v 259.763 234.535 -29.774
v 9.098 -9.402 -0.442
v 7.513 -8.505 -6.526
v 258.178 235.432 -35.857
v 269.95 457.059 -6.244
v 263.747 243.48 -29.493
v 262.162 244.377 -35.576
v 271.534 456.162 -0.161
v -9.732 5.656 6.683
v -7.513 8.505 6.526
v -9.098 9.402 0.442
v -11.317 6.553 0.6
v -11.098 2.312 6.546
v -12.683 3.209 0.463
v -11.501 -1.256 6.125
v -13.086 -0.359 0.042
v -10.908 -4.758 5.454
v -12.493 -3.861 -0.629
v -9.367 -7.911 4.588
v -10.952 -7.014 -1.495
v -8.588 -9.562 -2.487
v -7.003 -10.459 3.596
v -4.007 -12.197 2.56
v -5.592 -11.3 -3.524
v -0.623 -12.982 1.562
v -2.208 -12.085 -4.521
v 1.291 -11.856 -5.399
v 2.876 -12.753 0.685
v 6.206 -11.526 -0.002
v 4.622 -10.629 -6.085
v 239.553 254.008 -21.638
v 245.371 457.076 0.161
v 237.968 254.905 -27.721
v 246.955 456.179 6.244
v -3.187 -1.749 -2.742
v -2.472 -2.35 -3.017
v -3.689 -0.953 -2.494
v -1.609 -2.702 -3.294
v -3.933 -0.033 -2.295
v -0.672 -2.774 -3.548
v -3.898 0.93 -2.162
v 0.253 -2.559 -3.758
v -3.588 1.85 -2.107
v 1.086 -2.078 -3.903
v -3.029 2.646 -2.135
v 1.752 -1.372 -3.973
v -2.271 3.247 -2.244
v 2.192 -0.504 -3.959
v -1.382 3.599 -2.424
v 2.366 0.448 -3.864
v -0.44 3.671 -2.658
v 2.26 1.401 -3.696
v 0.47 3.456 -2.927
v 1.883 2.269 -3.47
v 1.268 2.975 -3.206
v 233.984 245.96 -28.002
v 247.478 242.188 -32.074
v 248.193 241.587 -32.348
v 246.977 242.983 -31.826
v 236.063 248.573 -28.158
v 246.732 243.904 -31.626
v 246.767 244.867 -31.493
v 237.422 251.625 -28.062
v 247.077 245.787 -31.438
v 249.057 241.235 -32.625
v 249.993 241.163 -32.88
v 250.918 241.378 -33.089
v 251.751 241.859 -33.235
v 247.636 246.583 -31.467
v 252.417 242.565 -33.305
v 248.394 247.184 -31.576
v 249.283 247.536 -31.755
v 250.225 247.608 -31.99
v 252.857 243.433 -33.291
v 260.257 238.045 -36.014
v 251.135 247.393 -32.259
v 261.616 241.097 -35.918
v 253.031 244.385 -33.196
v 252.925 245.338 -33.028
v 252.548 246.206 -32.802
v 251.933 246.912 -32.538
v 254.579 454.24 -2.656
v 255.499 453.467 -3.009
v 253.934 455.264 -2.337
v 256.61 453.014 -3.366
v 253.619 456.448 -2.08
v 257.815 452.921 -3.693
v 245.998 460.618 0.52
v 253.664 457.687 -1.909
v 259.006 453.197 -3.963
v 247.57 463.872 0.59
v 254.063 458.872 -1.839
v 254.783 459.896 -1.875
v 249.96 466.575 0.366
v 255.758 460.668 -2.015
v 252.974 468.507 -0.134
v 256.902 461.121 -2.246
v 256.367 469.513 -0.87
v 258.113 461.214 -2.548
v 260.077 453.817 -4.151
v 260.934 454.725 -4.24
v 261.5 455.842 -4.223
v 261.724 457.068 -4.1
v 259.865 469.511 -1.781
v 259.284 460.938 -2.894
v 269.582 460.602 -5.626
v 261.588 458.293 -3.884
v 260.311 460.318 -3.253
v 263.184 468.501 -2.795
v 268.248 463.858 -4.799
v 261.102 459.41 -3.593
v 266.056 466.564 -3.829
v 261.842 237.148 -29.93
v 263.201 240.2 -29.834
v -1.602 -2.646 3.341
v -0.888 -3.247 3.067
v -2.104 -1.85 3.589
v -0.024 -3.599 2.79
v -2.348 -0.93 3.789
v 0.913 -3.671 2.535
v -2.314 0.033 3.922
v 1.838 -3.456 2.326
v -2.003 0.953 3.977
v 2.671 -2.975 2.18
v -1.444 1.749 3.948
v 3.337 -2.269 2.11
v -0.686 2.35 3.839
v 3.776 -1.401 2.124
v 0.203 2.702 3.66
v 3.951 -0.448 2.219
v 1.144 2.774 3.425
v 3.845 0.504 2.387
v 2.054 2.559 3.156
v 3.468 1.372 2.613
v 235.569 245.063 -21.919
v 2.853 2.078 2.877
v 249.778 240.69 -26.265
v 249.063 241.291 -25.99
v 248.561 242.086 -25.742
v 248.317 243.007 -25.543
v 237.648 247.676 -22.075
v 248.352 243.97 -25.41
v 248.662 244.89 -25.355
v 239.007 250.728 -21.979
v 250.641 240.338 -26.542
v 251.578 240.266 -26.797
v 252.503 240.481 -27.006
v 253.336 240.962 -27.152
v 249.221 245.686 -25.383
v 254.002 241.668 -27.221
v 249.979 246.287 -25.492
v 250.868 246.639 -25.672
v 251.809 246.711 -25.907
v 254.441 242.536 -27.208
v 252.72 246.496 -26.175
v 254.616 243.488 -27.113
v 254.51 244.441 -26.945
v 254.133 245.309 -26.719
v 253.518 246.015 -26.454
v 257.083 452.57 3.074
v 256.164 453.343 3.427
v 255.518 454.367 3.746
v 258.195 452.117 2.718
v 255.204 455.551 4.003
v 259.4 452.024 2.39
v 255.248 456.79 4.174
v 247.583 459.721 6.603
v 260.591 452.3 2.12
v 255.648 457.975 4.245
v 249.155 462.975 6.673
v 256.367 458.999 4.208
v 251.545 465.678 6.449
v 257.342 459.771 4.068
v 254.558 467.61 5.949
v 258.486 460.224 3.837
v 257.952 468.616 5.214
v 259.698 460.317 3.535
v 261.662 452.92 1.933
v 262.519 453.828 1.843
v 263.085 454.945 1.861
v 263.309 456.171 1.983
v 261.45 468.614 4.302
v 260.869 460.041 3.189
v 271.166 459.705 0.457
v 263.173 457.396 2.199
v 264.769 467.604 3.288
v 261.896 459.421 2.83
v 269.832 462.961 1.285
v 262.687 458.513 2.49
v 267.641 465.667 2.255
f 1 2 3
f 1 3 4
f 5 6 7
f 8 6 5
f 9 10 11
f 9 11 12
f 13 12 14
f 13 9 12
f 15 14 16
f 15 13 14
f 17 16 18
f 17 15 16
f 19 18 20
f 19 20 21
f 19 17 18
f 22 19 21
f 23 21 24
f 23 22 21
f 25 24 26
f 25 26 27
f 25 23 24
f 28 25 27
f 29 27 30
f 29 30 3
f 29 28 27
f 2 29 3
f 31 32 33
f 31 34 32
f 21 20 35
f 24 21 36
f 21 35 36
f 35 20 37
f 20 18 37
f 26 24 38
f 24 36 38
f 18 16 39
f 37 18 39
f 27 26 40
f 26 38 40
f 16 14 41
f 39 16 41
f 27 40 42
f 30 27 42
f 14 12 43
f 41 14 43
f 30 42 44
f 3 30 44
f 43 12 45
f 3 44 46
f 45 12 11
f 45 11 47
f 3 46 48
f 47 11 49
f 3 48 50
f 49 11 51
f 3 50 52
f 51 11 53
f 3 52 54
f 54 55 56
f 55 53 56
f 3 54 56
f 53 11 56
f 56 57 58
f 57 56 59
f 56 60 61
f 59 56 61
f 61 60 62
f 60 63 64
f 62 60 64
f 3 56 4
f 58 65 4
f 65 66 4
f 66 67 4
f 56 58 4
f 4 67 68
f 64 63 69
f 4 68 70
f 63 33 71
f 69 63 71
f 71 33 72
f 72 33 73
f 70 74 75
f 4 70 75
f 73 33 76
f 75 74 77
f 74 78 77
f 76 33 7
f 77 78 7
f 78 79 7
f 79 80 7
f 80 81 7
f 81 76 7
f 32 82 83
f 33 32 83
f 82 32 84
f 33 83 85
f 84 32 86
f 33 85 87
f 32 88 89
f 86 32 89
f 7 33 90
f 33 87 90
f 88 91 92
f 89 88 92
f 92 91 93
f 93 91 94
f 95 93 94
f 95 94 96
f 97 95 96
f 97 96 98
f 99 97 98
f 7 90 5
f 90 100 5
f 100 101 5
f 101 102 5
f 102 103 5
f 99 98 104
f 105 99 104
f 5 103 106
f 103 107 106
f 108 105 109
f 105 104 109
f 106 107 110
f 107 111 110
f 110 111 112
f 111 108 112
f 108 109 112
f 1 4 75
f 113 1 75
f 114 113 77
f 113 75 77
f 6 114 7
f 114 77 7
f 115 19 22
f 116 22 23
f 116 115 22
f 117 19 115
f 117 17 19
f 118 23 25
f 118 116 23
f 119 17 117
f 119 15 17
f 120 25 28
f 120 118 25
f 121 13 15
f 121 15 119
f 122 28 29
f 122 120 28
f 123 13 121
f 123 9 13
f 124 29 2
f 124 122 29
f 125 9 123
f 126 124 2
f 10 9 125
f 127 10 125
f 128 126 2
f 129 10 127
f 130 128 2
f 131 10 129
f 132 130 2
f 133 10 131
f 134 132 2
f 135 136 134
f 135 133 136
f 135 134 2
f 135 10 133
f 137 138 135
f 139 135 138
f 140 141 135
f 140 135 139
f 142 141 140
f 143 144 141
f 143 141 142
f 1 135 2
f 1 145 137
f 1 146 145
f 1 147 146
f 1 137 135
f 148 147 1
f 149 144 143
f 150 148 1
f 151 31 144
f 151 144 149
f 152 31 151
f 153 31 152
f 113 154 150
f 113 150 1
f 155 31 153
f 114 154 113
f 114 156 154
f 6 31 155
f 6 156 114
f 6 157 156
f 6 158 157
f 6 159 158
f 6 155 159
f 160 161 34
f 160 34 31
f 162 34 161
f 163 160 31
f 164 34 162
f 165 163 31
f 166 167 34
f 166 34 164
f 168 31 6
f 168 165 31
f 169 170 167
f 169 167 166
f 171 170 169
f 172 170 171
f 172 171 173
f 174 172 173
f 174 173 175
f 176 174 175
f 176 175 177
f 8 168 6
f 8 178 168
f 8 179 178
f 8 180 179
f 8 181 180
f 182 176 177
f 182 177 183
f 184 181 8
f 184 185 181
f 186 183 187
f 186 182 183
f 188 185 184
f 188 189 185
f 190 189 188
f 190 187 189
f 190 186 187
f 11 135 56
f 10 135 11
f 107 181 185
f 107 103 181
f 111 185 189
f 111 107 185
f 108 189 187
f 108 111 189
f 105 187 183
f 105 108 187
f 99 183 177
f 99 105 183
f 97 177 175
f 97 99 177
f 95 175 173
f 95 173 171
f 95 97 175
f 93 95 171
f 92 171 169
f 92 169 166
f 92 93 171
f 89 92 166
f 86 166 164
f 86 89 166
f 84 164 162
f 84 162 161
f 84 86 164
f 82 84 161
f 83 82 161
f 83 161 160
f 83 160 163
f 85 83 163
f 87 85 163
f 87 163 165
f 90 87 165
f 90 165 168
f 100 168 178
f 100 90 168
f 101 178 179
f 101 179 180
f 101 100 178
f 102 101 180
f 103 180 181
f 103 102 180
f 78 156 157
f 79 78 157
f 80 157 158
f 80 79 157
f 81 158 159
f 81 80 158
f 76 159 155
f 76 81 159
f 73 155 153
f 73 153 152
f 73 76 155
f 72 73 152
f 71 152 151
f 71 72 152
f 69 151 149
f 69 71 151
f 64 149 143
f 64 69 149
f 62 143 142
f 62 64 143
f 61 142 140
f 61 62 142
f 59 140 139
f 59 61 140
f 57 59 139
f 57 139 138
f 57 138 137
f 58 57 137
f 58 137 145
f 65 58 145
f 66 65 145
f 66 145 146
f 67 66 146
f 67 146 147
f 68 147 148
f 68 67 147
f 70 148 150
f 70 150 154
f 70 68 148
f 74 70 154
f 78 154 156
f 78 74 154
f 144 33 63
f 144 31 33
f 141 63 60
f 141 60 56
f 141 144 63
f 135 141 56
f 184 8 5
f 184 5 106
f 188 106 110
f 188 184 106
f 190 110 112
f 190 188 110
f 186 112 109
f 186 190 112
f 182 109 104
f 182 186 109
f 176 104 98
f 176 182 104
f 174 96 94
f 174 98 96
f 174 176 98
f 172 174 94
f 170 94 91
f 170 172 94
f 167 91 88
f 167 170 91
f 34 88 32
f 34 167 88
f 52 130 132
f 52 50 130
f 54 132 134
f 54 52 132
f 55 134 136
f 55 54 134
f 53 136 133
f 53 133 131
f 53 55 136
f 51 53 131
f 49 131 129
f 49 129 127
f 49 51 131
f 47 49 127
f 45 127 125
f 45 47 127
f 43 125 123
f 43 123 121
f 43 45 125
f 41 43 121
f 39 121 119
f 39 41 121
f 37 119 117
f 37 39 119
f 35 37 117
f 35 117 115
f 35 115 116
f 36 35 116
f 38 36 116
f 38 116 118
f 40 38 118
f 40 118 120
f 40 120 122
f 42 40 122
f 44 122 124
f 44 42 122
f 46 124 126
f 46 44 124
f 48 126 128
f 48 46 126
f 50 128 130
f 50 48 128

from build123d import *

# Parameters (mm, degrees)
SKETCH2_R           = 12.7
SKETCH2_R_2         = 3.2639
SKETCH2_R_3         = 4.19989
BOSS_EXTRUDE1_DEPTH = 3.175


with BuildPart() as part:
    # Sketch2 → Boss-Extrude1 (new, symmetric)
    # profile 1 of 7: a face of its own
    with BuildSketch(Plane(origin=(0, 0, 0), x_dir=(0.9683571483215458, 0.03640581426885692, -0.2468988658985399), z_dir=(0.24956849419460725, -0.14125913850417393, 0.9579986547456604))):
        with BuildLine():
            Line((242.448329145, 239.243930423), (-8.577063088, 9.366108518))
            ThreePointArc((-8.577063088, 9.366108518), (5.11670298, 11.623654787), (12.7, 0))
            ThreePointArc((12.7, 0), (11.623654787, -5.11670298), (8.577063088, -9.366108518))
            Line((8.577063088, -9.366108518), (267.433066466, 227.682636686))
            ThreePointArc((267.433066466, 227.682636686), (253.522604962, 225.522910686), (246.164904285, 237.524143805))
            Line((246.164904285, 237.524143805), (246.363634717, 242.829392073))
            Line((246.363634717, 242.829392073), (242.448329145, 239.243930423))
        make_face()
    # profile 2 of 7: a face of its own
    with BuildSketch(Plane(origin=(0, 0, 0), x_dir=(0.9683571483215458, 0.03640581426885692, -0.2468988658985399), z_dir=(0.24956849419460725, -0.14125913850417393, 0.9579986547456604))):
        Circle(SKETCH2_R)
        with Locations(Location((0, 0, 0), (0, 0, 357.892497398))):
            Circle(SKETCH2_R_2, mode=Mode.SUBTRACT)
    # profile 3 of 7: a face of its own
    with BuildSketch(Plane(origin=(0, 0, 0), x_dir=(0.9683571483215458, 0.03640581426885692, -0.2468988658985399), z_dir=(0.24956849419460725, -0.14125913850417393, 0.9579986547456604))):
        with Locations((258.856003378, 237.048745204)):
            Circle(SKETCH2_R)
        with Locations(Location((258.856003378, 237.048745204, 0), (0, 0, 357.892497398))):
            Circle(SKETCH2_R_2, mode=Mode.SUBTRACT)
    # profile 4 of 7: a face of its own
    with BuildSketch(Plane(origin=(0, 0, 0), x_dir=(0.9683571483215458, 0.03640581426885692, -0.2468988658985399), z_dir=(0.24956849419460725, -0.14125913850417393, 0.9579986547456604))):
        with BuildLine():
            Line((246.562365149, 248.134640341), (246.363634717, 242.829392073))
            Line((246.363634717, 242.829392073), (250.278940289, 246.414853723))
            ThreePointArc((250.278940289, 246.414853723), (263.972706358, 248.672399992), (271.556003378, 237.048745204))
            ThreePointArc((271.556003378, 237.048745204), (271.553777956, 236.811004245), (271.54710247, 236.573346604))
            Line((271.54710247, 236.573346604), (279.589066496, 451.259216922))
            ThreePointArc((279.589066496, 451.259216922), (266.422568803, 439.04351643), (254.206868311, 452.210014123))
            Line((254.206868311, 452.210014123), (246.562365149, 248.134640341))
        make_face()
    # profile 5 of 7: a face of its own
    with BuildSketch(Plane(origin=(0, 0, 0), x_dir=(0.9683571483215458, 0.03640581426885692, -0.2468988658985399), z_dir=(0.24956849419460725, -0.14125913850417393, 0.9579986547456604))):
        with BuildLine():
            Line((250.278940289, 246.414853723), (246.363634717, 242.829392073))
            Line((246.363634717, 242.829392073), (246.164904285, 237.524143805))
            ThreePointArc((246.164904285, 237.524143805), (247.330168859, 242.38214362), (250.278940289, 246.414853723))
        make_face()
    # profile 6 of 7: a face of its own
    with BuildSketch(Plane(origin=(0, 0, 0), x_dir=(0.9683571483215458, 0.03640581426885692, -0.2468988658985399), z_dir=(0.24956849419460725, -0.14125913850417393, 0.9579986547456604))):
        with Locations((266.897967404, 451.734615523)):
            Circle(SKETCH2_R)
        with Locations(Location((266.897967404, 451.734615523, 0), (0, 0, 357.892497398))):
            Circle(SKETCH2_R_3, mode=Mode.SUBTRACT)
    # profile 7 of 7: a face of its own
    with BuildSketch(Plane(origin=(0, 0, 0), x_dir=(0.9683571483215458, 0.03640581426885692, -0.2468988658985399), z_dir=(0.24956849419460725, -0.14125913850417393, 0.9579986547456604))):
        with BuildLine():
            ThreePointArc((246.562365149, 248.134640341), (245.397100575, 243.276640526), (242.448329145, 239.243930423))
            Line((242.448329145, 239.243930423), (246.363634717, 242.829392073))
            Line((246.363634717, 242.829392073), (246.562365149, 248.134640341))
        make_face()
    extrude(amount=BOSS_EXTRUDE1_DEPTH, both=True)


solid = part.part
